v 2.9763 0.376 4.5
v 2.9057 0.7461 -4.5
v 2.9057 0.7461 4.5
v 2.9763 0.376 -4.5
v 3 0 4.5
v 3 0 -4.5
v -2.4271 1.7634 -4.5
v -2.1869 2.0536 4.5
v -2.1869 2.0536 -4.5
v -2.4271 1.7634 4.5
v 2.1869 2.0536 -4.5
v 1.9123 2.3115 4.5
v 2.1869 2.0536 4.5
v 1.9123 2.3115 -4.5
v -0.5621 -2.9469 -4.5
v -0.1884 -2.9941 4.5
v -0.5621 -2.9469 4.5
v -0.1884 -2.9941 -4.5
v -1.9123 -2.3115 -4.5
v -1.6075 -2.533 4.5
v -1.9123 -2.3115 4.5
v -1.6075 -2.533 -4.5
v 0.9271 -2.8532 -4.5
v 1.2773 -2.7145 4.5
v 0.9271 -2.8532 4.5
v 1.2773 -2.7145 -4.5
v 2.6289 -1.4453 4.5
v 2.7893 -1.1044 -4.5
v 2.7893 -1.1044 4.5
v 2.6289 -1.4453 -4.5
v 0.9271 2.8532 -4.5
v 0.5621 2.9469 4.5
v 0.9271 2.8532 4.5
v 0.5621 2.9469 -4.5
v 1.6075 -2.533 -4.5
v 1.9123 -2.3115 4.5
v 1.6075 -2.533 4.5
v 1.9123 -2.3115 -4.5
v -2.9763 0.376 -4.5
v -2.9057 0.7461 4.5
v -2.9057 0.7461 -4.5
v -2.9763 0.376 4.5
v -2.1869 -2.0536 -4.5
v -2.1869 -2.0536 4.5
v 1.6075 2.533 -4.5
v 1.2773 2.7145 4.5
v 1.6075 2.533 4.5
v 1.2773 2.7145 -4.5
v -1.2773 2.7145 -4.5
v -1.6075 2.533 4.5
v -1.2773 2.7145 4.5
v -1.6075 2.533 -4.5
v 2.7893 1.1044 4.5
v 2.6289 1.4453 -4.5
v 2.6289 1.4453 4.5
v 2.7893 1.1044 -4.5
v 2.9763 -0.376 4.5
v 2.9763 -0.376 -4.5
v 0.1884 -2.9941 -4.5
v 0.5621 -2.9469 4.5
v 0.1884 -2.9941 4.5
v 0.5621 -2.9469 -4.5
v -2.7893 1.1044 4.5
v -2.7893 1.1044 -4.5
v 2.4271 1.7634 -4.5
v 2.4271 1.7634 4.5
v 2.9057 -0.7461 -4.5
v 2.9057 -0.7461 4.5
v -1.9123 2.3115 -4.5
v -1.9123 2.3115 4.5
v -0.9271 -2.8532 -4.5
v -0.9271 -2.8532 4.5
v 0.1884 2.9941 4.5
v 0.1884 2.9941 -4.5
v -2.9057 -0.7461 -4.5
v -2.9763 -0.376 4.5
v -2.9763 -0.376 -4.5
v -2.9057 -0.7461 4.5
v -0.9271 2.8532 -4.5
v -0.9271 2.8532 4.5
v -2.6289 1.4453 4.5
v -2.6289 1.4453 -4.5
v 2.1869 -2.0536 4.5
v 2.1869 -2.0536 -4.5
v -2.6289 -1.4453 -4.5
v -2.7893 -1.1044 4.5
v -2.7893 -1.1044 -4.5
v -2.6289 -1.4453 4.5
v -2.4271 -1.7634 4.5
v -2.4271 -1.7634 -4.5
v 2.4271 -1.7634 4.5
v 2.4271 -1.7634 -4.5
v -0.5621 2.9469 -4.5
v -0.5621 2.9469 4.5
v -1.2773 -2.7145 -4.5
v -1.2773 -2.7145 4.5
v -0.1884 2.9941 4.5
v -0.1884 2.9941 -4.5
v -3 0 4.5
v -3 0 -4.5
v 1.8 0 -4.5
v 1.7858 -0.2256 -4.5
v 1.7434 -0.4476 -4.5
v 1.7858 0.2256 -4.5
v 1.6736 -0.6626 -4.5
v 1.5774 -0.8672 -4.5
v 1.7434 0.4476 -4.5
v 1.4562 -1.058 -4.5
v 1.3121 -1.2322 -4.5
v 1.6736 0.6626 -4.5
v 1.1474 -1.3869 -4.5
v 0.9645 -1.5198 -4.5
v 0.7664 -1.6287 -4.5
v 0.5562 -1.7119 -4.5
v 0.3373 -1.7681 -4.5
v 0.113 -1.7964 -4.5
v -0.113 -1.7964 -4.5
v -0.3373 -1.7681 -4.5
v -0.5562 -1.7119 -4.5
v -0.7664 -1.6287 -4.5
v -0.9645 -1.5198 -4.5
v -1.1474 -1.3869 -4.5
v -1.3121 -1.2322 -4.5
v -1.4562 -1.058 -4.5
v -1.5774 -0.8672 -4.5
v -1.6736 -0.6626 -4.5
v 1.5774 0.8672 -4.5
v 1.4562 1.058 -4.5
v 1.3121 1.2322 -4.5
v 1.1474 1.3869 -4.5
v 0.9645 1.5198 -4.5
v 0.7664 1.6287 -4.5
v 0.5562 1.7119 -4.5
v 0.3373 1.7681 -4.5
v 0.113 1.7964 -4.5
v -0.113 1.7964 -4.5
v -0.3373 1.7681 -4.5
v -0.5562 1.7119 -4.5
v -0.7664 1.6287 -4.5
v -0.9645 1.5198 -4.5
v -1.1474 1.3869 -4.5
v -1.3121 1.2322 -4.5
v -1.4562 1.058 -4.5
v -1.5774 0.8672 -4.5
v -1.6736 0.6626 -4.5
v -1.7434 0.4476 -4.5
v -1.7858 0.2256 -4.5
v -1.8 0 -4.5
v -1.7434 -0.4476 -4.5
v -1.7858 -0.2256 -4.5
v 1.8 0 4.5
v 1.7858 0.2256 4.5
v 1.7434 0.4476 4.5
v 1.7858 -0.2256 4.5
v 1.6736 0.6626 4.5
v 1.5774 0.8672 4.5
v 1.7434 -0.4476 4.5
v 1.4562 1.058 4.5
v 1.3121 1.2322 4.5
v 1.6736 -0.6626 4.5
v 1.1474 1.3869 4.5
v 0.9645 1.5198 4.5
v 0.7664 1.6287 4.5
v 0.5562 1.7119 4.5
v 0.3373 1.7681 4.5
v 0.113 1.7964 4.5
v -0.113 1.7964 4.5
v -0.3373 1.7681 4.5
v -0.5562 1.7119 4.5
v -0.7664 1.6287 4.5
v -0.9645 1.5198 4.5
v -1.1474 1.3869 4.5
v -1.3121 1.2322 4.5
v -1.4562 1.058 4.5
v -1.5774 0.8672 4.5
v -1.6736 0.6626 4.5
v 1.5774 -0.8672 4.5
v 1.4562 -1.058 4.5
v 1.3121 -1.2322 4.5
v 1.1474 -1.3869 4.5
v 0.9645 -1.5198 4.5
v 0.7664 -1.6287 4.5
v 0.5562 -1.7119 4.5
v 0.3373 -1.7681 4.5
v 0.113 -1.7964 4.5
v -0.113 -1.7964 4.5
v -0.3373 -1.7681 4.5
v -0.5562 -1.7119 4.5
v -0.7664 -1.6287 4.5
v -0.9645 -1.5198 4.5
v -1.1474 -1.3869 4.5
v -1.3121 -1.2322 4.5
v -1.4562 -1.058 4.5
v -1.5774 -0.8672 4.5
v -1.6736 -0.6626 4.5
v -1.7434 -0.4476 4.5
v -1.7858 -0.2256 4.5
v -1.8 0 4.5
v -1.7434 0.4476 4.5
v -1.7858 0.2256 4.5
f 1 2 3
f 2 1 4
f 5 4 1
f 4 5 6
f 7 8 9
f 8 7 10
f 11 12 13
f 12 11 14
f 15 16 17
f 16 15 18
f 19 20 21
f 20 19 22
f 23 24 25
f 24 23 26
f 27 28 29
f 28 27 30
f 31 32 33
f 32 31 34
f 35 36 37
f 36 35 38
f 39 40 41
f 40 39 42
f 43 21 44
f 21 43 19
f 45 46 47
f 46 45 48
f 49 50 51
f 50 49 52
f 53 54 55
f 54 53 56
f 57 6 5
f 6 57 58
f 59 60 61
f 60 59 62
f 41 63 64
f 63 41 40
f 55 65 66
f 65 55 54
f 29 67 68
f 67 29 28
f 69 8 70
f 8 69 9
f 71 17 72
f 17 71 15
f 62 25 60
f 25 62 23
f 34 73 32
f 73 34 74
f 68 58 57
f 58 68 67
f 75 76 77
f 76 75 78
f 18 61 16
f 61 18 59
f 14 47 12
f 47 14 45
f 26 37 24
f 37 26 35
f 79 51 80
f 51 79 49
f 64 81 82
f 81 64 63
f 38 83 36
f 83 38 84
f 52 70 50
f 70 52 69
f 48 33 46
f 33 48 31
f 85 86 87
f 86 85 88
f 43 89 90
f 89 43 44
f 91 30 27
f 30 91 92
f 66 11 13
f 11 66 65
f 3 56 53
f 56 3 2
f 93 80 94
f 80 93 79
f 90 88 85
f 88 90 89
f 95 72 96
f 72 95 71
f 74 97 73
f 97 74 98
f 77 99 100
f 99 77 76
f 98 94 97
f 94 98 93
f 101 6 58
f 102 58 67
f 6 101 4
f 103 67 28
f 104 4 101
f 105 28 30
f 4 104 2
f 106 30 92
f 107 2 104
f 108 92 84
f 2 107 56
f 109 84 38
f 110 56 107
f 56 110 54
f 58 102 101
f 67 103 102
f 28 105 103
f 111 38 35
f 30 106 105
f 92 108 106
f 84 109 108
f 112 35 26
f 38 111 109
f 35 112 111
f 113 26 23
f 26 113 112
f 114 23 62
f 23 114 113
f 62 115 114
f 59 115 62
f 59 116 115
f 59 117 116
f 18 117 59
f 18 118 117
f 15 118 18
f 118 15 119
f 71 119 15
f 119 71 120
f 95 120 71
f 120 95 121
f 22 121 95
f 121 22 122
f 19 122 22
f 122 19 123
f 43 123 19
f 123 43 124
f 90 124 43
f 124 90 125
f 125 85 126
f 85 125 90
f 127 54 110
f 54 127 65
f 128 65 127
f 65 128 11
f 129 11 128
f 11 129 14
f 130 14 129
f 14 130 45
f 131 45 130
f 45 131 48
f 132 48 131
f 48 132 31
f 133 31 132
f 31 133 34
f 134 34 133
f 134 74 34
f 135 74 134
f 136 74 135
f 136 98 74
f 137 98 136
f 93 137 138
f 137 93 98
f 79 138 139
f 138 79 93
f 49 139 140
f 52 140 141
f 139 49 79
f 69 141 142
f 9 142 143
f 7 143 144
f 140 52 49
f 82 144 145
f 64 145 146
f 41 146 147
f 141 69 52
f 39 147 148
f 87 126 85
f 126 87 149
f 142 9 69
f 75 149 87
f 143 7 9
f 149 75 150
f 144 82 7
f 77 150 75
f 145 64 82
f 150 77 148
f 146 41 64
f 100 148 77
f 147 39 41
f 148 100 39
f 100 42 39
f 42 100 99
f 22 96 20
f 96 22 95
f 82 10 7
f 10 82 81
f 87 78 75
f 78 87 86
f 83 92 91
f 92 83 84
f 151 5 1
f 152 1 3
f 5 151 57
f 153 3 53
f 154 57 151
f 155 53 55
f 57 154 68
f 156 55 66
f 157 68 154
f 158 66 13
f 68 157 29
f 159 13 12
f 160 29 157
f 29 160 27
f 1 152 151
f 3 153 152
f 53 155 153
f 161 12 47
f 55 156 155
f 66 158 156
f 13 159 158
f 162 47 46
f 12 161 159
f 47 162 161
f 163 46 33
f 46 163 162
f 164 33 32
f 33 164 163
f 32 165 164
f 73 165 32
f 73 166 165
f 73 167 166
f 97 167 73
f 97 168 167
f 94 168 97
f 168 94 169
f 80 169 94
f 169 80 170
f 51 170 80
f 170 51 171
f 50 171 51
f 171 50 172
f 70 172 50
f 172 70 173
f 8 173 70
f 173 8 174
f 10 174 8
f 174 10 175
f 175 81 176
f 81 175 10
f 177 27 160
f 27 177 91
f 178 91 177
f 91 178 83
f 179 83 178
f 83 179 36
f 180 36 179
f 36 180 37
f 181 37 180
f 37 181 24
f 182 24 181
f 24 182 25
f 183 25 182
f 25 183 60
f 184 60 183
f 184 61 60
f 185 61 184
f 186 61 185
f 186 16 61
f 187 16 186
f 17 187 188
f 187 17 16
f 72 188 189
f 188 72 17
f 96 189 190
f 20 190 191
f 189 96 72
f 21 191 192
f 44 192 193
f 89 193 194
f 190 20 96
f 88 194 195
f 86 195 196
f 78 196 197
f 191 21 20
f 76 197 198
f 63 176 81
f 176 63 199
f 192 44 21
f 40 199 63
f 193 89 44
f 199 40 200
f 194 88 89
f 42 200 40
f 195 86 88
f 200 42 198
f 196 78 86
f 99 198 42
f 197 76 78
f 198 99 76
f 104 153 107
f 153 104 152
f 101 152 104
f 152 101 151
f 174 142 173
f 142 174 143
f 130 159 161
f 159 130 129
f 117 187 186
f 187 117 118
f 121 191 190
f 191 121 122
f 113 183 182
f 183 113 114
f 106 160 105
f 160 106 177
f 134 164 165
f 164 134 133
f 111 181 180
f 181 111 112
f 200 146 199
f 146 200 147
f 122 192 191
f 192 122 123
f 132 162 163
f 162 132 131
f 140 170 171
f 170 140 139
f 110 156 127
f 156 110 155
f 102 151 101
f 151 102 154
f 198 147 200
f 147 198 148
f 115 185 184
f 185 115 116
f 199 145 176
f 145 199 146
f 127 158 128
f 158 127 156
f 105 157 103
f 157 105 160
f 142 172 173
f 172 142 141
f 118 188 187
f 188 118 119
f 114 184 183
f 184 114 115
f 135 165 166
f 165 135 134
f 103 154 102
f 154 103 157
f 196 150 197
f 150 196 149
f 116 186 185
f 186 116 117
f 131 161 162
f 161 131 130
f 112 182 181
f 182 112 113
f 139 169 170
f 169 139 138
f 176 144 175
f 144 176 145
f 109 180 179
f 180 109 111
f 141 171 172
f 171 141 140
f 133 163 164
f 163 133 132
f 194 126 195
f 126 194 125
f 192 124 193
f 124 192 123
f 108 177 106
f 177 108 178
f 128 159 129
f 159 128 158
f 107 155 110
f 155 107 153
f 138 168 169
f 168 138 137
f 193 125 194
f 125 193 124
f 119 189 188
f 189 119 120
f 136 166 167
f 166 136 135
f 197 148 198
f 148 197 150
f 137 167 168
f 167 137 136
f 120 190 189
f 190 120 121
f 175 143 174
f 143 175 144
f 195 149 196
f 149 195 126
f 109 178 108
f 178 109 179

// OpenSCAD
$fn = 50;


difference() {
	union() {
		translate(v = [0, 0, -4.5000000000]) {
			cylinder(h = 9, r = 3.0000000000);
		}
	}
	union() {
		#translate(v = [0, 0, -100.0000000000]) {
			cylinder(h = 200, r = 1.8000000000);
		}
	}
}
